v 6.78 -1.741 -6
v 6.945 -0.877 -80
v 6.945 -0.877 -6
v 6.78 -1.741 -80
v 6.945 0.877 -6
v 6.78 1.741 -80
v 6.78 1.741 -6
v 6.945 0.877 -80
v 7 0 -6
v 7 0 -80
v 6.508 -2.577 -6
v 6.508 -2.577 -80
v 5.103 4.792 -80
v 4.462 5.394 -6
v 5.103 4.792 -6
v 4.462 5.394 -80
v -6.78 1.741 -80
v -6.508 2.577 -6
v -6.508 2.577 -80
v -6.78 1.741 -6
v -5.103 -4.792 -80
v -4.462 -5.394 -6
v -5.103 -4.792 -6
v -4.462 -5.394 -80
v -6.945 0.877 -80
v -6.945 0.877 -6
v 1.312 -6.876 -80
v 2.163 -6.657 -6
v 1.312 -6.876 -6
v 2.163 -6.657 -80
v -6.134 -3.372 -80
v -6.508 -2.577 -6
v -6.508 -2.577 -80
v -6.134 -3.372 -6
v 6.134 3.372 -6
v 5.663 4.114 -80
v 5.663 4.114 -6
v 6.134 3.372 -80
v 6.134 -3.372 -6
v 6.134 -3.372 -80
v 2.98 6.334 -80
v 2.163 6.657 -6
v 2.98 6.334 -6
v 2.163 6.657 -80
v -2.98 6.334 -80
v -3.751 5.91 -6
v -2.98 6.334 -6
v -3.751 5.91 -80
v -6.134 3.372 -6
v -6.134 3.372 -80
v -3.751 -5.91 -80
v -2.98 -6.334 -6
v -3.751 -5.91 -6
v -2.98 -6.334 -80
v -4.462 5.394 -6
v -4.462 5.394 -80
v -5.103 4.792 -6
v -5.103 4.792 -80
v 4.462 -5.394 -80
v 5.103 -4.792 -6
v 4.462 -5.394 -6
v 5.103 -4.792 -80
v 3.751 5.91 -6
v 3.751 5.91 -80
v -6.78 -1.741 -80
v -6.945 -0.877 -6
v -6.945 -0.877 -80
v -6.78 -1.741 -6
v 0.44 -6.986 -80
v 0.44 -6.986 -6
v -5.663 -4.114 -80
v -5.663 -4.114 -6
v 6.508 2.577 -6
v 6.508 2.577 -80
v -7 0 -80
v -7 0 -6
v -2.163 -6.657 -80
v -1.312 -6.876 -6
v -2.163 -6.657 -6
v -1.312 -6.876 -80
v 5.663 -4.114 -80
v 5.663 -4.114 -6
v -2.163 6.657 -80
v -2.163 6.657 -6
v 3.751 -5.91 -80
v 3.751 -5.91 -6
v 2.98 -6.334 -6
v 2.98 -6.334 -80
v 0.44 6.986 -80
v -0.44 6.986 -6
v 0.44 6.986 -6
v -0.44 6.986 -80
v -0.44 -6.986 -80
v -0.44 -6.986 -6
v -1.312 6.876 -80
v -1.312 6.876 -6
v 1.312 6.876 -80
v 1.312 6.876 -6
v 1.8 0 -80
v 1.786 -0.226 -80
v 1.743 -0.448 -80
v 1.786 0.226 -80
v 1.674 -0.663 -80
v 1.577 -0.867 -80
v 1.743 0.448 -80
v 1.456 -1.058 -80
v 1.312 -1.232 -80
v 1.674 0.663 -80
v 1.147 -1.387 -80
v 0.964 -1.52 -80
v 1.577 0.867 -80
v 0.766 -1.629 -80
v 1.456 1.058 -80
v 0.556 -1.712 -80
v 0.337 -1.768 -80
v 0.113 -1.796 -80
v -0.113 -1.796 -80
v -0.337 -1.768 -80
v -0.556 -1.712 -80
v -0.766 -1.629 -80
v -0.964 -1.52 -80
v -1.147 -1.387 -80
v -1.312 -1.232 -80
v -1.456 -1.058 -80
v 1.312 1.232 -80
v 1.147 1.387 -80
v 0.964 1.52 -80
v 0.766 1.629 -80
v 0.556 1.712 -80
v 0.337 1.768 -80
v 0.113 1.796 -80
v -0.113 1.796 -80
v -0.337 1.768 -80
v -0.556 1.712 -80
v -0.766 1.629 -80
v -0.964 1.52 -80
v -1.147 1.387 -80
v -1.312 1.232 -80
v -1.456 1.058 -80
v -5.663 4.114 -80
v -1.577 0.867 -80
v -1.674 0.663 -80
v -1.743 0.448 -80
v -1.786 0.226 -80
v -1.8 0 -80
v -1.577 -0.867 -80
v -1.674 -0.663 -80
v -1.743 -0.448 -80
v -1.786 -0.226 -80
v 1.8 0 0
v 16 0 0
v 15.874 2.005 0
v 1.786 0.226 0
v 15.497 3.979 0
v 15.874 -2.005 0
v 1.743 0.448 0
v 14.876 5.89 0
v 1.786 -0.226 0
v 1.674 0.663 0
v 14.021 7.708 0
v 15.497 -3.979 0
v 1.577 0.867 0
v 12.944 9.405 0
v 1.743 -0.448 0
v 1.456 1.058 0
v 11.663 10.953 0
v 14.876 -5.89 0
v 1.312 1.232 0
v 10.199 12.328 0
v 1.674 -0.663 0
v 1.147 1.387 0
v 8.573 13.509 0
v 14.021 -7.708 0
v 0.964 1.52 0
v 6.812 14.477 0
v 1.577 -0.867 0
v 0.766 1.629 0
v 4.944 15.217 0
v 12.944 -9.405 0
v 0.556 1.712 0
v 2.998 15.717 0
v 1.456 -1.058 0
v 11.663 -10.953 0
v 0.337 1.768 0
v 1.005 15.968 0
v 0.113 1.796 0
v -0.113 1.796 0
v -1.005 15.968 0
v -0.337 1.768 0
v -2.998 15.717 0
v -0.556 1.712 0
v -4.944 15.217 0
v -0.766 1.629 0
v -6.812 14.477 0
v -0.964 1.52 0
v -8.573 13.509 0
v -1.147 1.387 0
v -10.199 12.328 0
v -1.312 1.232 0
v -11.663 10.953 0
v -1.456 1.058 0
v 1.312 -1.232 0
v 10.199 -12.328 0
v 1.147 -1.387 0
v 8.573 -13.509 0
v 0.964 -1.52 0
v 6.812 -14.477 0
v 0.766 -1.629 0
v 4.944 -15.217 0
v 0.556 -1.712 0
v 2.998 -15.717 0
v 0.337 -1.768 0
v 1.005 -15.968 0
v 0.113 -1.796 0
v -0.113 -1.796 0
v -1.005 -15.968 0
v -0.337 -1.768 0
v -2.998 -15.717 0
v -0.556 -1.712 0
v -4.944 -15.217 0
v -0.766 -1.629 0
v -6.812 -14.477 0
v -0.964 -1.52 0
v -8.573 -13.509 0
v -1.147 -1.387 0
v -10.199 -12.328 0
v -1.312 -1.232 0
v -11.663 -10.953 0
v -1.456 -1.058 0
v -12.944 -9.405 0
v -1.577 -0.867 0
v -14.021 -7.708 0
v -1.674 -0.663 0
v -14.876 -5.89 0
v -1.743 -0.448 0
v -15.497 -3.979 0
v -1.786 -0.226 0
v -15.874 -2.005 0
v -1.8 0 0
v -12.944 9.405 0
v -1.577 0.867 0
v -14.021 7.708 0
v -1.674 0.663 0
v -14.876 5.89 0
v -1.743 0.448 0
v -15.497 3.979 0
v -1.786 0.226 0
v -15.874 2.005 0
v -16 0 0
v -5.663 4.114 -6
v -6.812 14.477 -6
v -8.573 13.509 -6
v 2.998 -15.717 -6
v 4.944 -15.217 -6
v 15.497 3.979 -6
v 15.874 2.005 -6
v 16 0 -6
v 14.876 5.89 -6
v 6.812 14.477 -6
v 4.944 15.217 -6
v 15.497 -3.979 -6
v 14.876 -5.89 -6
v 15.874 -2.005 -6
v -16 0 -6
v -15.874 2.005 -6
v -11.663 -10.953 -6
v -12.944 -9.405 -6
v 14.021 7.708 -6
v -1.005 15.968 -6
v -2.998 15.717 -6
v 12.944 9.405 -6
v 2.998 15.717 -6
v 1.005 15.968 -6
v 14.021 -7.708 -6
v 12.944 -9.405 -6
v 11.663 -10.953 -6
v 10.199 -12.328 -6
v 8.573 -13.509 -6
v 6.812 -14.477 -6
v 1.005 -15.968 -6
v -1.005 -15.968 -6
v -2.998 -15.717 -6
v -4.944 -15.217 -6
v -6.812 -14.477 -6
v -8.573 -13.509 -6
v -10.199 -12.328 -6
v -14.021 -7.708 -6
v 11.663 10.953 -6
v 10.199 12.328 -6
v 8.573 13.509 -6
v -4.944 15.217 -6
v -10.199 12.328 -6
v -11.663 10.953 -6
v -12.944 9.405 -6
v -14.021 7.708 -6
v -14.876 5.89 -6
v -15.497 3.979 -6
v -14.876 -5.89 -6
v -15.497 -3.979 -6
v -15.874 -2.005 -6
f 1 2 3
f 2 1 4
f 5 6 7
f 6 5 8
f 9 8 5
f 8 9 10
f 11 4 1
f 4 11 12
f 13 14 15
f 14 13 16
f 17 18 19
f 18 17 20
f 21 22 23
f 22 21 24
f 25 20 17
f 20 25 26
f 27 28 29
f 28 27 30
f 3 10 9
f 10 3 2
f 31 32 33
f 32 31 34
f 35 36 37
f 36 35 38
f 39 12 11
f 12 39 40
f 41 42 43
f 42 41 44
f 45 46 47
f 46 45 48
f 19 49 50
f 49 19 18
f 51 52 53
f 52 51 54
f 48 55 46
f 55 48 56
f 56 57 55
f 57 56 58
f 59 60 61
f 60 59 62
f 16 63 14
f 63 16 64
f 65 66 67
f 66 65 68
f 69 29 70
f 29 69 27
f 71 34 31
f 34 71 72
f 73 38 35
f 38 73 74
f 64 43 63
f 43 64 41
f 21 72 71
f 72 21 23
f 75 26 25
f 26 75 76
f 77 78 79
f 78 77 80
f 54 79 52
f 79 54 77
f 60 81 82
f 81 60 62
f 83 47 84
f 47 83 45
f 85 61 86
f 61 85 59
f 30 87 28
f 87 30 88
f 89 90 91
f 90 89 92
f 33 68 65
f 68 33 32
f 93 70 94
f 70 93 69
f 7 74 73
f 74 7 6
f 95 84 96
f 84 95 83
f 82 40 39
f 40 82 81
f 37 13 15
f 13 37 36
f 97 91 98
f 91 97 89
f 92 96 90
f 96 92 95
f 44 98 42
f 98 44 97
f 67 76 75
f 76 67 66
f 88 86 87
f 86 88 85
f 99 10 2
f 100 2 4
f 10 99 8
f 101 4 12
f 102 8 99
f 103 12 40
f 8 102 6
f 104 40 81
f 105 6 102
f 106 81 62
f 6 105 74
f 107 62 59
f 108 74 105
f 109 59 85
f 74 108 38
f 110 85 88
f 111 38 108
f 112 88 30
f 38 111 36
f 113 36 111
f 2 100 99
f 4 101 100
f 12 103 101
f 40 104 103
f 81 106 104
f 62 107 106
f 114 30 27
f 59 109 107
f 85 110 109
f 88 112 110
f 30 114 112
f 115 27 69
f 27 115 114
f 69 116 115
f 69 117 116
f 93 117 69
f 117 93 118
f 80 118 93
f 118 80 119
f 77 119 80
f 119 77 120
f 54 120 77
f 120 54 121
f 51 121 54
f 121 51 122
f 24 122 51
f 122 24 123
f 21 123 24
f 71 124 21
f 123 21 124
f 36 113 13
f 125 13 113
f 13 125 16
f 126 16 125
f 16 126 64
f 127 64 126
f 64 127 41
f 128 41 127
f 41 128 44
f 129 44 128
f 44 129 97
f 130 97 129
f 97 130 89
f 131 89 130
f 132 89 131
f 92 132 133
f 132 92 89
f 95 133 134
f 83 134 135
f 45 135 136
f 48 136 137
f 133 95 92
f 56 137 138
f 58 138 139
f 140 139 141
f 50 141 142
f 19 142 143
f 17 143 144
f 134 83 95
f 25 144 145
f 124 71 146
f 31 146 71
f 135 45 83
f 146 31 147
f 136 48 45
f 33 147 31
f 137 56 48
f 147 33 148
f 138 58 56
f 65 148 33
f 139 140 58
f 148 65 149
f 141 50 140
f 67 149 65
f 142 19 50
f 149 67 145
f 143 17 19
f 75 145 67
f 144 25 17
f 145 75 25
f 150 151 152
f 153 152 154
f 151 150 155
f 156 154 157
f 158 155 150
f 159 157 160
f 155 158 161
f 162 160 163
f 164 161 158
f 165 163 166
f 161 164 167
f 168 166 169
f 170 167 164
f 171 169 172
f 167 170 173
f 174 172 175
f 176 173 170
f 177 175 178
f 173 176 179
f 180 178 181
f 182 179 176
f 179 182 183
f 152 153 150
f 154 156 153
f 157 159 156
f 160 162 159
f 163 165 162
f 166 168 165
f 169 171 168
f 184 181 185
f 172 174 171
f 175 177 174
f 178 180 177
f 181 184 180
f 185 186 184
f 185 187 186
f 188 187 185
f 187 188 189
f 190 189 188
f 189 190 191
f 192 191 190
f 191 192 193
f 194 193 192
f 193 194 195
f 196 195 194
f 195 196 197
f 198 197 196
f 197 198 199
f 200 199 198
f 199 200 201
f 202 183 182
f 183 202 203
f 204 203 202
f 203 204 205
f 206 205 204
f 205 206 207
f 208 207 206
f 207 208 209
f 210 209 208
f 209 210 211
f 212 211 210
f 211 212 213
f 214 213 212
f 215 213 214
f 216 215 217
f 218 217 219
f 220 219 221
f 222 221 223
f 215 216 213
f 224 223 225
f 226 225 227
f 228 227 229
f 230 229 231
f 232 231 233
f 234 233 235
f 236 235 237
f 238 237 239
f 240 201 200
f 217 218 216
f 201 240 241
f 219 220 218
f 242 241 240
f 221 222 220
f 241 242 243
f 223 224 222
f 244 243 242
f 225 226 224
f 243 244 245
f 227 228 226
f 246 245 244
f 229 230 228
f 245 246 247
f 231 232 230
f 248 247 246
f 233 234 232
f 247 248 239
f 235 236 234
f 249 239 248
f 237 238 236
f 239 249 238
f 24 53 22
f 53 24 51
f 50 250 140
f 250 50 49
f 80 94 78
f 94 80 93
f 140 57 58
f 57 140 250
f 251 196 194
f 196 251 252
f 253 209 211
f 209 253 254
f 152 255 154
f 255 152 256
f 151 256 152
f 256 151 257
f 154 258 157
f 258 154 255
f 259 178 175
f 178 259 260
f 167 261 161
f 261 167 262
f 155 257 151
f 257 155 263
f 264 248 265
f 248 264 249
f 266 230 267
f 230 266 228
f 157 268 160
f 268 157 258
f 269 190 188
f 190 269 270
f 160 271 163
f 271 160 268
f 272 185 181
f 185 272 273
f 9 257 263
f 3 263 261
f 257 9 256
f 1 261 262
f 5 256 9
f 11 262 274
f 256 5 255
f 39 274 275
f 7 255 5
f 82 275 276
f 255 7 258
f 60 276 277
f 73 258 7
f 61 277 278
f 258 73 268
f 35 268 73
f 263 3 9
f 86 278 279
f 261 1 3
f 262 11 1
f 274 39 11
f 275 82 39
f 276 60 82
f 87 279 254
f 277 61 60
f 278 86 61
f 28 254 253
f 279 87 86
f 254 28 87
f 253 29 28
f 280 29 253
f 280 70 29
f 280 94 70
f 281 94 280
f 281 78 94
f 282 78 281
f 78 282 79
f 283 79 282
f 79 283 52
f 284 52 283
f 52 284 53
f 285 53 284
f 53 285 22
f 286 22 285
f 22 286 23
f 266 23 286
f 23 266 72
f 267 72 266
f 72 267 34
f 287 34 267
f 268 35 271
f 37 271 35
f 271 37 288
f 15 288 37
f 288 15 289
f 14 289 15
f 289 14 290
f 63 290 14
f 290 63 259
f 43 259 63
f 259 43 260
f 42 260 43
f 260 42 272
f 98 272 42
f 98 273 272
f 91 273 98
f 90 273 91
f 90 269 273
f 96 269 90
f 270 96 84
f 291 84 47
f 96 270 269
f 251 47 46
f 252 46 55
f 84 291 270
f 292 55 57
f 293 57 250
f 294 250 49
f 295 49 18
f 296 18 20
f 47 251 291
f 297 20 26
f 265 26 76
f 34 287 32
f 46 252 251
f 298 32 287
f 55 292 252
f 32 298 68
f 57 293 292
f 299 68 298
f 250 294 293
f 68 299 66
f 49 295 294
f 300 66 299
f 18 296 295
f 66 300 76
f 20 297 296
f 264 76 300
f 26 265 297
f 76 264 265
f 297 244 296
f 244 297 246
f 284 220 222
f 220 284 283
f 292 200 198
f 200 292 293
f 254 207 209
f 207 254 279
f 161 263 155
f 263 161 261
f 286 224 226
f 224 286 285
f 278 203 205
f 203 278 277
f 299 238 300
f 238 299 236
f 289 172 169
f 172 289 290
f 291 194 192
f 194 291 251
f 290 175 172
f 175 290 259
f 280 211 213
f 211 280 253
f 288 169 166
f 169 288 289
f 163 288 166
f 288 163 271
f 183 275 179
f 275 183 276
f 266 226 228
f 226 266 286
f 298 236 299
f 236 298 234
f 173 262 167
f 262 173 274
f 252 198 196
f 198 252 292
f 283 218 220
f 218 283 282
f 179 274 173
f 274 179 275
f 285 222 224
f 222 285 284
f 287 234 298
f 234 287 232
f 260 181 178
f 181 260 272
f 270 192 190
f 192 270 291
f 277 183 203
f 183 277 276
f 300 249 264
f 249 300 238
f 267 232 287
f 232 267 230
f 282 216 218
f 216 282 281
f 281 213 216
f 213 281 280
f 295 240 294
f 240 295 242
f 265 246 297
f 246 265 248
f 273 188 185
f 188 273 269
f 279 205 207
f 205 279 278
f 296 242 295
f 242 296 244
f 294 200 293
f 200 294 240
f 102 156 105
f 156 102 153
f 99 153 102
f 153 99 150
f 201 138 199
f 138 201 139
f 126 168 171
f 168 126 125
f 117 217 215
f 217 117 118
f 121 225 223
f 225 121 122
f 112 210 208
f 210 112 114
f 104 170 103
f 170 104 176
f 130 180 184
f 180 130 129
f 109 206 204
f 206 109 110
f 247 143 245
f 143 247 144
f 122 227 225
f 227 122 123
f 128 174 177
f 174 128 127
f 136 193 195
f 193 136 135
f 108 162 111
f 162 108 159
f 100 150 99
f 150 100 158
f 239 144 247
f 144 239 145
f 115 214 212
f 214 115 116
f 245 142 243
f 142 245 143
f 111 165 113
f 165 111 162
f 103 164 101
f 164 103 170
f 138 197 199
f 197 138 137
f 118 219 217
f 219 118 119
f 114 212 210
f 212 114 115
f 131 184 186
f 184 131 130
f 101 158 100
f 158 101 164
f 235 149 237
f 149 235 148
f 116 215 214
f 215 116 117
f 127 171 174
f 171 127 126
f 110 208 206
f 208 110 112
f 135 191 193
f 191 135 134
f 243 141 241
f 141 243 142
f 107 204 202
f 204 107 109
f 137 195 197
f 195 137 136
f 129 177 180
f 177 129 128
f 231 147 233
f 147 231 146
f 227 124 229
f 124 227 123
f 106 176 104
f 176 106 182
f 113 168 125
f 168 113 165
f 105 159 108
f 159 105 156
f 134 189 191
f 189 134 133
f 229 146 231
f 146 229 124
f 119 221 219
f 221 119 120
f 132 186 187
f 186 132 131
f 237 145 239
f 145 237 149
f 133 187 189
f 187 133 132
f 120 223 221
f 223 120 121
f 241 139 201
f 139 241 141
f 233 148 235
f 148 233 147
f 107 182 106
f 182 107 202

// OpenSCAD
$fn = 50;


difference() {
	union() {
		translate(v = [0, 0, -80.0000000000]) {
			cylinder(h = 80, r = 7.0000000000);
		}
		translate(v = [0, 0, -6.0000000000]) {
			cylinder(h = 6, r = 16.0000000000);
		}
	}
	union() {
		#translate(v = [0, 0, -80]) {
			cylinder(h = 80, r = 1.8000000000);
		}
	}
}
